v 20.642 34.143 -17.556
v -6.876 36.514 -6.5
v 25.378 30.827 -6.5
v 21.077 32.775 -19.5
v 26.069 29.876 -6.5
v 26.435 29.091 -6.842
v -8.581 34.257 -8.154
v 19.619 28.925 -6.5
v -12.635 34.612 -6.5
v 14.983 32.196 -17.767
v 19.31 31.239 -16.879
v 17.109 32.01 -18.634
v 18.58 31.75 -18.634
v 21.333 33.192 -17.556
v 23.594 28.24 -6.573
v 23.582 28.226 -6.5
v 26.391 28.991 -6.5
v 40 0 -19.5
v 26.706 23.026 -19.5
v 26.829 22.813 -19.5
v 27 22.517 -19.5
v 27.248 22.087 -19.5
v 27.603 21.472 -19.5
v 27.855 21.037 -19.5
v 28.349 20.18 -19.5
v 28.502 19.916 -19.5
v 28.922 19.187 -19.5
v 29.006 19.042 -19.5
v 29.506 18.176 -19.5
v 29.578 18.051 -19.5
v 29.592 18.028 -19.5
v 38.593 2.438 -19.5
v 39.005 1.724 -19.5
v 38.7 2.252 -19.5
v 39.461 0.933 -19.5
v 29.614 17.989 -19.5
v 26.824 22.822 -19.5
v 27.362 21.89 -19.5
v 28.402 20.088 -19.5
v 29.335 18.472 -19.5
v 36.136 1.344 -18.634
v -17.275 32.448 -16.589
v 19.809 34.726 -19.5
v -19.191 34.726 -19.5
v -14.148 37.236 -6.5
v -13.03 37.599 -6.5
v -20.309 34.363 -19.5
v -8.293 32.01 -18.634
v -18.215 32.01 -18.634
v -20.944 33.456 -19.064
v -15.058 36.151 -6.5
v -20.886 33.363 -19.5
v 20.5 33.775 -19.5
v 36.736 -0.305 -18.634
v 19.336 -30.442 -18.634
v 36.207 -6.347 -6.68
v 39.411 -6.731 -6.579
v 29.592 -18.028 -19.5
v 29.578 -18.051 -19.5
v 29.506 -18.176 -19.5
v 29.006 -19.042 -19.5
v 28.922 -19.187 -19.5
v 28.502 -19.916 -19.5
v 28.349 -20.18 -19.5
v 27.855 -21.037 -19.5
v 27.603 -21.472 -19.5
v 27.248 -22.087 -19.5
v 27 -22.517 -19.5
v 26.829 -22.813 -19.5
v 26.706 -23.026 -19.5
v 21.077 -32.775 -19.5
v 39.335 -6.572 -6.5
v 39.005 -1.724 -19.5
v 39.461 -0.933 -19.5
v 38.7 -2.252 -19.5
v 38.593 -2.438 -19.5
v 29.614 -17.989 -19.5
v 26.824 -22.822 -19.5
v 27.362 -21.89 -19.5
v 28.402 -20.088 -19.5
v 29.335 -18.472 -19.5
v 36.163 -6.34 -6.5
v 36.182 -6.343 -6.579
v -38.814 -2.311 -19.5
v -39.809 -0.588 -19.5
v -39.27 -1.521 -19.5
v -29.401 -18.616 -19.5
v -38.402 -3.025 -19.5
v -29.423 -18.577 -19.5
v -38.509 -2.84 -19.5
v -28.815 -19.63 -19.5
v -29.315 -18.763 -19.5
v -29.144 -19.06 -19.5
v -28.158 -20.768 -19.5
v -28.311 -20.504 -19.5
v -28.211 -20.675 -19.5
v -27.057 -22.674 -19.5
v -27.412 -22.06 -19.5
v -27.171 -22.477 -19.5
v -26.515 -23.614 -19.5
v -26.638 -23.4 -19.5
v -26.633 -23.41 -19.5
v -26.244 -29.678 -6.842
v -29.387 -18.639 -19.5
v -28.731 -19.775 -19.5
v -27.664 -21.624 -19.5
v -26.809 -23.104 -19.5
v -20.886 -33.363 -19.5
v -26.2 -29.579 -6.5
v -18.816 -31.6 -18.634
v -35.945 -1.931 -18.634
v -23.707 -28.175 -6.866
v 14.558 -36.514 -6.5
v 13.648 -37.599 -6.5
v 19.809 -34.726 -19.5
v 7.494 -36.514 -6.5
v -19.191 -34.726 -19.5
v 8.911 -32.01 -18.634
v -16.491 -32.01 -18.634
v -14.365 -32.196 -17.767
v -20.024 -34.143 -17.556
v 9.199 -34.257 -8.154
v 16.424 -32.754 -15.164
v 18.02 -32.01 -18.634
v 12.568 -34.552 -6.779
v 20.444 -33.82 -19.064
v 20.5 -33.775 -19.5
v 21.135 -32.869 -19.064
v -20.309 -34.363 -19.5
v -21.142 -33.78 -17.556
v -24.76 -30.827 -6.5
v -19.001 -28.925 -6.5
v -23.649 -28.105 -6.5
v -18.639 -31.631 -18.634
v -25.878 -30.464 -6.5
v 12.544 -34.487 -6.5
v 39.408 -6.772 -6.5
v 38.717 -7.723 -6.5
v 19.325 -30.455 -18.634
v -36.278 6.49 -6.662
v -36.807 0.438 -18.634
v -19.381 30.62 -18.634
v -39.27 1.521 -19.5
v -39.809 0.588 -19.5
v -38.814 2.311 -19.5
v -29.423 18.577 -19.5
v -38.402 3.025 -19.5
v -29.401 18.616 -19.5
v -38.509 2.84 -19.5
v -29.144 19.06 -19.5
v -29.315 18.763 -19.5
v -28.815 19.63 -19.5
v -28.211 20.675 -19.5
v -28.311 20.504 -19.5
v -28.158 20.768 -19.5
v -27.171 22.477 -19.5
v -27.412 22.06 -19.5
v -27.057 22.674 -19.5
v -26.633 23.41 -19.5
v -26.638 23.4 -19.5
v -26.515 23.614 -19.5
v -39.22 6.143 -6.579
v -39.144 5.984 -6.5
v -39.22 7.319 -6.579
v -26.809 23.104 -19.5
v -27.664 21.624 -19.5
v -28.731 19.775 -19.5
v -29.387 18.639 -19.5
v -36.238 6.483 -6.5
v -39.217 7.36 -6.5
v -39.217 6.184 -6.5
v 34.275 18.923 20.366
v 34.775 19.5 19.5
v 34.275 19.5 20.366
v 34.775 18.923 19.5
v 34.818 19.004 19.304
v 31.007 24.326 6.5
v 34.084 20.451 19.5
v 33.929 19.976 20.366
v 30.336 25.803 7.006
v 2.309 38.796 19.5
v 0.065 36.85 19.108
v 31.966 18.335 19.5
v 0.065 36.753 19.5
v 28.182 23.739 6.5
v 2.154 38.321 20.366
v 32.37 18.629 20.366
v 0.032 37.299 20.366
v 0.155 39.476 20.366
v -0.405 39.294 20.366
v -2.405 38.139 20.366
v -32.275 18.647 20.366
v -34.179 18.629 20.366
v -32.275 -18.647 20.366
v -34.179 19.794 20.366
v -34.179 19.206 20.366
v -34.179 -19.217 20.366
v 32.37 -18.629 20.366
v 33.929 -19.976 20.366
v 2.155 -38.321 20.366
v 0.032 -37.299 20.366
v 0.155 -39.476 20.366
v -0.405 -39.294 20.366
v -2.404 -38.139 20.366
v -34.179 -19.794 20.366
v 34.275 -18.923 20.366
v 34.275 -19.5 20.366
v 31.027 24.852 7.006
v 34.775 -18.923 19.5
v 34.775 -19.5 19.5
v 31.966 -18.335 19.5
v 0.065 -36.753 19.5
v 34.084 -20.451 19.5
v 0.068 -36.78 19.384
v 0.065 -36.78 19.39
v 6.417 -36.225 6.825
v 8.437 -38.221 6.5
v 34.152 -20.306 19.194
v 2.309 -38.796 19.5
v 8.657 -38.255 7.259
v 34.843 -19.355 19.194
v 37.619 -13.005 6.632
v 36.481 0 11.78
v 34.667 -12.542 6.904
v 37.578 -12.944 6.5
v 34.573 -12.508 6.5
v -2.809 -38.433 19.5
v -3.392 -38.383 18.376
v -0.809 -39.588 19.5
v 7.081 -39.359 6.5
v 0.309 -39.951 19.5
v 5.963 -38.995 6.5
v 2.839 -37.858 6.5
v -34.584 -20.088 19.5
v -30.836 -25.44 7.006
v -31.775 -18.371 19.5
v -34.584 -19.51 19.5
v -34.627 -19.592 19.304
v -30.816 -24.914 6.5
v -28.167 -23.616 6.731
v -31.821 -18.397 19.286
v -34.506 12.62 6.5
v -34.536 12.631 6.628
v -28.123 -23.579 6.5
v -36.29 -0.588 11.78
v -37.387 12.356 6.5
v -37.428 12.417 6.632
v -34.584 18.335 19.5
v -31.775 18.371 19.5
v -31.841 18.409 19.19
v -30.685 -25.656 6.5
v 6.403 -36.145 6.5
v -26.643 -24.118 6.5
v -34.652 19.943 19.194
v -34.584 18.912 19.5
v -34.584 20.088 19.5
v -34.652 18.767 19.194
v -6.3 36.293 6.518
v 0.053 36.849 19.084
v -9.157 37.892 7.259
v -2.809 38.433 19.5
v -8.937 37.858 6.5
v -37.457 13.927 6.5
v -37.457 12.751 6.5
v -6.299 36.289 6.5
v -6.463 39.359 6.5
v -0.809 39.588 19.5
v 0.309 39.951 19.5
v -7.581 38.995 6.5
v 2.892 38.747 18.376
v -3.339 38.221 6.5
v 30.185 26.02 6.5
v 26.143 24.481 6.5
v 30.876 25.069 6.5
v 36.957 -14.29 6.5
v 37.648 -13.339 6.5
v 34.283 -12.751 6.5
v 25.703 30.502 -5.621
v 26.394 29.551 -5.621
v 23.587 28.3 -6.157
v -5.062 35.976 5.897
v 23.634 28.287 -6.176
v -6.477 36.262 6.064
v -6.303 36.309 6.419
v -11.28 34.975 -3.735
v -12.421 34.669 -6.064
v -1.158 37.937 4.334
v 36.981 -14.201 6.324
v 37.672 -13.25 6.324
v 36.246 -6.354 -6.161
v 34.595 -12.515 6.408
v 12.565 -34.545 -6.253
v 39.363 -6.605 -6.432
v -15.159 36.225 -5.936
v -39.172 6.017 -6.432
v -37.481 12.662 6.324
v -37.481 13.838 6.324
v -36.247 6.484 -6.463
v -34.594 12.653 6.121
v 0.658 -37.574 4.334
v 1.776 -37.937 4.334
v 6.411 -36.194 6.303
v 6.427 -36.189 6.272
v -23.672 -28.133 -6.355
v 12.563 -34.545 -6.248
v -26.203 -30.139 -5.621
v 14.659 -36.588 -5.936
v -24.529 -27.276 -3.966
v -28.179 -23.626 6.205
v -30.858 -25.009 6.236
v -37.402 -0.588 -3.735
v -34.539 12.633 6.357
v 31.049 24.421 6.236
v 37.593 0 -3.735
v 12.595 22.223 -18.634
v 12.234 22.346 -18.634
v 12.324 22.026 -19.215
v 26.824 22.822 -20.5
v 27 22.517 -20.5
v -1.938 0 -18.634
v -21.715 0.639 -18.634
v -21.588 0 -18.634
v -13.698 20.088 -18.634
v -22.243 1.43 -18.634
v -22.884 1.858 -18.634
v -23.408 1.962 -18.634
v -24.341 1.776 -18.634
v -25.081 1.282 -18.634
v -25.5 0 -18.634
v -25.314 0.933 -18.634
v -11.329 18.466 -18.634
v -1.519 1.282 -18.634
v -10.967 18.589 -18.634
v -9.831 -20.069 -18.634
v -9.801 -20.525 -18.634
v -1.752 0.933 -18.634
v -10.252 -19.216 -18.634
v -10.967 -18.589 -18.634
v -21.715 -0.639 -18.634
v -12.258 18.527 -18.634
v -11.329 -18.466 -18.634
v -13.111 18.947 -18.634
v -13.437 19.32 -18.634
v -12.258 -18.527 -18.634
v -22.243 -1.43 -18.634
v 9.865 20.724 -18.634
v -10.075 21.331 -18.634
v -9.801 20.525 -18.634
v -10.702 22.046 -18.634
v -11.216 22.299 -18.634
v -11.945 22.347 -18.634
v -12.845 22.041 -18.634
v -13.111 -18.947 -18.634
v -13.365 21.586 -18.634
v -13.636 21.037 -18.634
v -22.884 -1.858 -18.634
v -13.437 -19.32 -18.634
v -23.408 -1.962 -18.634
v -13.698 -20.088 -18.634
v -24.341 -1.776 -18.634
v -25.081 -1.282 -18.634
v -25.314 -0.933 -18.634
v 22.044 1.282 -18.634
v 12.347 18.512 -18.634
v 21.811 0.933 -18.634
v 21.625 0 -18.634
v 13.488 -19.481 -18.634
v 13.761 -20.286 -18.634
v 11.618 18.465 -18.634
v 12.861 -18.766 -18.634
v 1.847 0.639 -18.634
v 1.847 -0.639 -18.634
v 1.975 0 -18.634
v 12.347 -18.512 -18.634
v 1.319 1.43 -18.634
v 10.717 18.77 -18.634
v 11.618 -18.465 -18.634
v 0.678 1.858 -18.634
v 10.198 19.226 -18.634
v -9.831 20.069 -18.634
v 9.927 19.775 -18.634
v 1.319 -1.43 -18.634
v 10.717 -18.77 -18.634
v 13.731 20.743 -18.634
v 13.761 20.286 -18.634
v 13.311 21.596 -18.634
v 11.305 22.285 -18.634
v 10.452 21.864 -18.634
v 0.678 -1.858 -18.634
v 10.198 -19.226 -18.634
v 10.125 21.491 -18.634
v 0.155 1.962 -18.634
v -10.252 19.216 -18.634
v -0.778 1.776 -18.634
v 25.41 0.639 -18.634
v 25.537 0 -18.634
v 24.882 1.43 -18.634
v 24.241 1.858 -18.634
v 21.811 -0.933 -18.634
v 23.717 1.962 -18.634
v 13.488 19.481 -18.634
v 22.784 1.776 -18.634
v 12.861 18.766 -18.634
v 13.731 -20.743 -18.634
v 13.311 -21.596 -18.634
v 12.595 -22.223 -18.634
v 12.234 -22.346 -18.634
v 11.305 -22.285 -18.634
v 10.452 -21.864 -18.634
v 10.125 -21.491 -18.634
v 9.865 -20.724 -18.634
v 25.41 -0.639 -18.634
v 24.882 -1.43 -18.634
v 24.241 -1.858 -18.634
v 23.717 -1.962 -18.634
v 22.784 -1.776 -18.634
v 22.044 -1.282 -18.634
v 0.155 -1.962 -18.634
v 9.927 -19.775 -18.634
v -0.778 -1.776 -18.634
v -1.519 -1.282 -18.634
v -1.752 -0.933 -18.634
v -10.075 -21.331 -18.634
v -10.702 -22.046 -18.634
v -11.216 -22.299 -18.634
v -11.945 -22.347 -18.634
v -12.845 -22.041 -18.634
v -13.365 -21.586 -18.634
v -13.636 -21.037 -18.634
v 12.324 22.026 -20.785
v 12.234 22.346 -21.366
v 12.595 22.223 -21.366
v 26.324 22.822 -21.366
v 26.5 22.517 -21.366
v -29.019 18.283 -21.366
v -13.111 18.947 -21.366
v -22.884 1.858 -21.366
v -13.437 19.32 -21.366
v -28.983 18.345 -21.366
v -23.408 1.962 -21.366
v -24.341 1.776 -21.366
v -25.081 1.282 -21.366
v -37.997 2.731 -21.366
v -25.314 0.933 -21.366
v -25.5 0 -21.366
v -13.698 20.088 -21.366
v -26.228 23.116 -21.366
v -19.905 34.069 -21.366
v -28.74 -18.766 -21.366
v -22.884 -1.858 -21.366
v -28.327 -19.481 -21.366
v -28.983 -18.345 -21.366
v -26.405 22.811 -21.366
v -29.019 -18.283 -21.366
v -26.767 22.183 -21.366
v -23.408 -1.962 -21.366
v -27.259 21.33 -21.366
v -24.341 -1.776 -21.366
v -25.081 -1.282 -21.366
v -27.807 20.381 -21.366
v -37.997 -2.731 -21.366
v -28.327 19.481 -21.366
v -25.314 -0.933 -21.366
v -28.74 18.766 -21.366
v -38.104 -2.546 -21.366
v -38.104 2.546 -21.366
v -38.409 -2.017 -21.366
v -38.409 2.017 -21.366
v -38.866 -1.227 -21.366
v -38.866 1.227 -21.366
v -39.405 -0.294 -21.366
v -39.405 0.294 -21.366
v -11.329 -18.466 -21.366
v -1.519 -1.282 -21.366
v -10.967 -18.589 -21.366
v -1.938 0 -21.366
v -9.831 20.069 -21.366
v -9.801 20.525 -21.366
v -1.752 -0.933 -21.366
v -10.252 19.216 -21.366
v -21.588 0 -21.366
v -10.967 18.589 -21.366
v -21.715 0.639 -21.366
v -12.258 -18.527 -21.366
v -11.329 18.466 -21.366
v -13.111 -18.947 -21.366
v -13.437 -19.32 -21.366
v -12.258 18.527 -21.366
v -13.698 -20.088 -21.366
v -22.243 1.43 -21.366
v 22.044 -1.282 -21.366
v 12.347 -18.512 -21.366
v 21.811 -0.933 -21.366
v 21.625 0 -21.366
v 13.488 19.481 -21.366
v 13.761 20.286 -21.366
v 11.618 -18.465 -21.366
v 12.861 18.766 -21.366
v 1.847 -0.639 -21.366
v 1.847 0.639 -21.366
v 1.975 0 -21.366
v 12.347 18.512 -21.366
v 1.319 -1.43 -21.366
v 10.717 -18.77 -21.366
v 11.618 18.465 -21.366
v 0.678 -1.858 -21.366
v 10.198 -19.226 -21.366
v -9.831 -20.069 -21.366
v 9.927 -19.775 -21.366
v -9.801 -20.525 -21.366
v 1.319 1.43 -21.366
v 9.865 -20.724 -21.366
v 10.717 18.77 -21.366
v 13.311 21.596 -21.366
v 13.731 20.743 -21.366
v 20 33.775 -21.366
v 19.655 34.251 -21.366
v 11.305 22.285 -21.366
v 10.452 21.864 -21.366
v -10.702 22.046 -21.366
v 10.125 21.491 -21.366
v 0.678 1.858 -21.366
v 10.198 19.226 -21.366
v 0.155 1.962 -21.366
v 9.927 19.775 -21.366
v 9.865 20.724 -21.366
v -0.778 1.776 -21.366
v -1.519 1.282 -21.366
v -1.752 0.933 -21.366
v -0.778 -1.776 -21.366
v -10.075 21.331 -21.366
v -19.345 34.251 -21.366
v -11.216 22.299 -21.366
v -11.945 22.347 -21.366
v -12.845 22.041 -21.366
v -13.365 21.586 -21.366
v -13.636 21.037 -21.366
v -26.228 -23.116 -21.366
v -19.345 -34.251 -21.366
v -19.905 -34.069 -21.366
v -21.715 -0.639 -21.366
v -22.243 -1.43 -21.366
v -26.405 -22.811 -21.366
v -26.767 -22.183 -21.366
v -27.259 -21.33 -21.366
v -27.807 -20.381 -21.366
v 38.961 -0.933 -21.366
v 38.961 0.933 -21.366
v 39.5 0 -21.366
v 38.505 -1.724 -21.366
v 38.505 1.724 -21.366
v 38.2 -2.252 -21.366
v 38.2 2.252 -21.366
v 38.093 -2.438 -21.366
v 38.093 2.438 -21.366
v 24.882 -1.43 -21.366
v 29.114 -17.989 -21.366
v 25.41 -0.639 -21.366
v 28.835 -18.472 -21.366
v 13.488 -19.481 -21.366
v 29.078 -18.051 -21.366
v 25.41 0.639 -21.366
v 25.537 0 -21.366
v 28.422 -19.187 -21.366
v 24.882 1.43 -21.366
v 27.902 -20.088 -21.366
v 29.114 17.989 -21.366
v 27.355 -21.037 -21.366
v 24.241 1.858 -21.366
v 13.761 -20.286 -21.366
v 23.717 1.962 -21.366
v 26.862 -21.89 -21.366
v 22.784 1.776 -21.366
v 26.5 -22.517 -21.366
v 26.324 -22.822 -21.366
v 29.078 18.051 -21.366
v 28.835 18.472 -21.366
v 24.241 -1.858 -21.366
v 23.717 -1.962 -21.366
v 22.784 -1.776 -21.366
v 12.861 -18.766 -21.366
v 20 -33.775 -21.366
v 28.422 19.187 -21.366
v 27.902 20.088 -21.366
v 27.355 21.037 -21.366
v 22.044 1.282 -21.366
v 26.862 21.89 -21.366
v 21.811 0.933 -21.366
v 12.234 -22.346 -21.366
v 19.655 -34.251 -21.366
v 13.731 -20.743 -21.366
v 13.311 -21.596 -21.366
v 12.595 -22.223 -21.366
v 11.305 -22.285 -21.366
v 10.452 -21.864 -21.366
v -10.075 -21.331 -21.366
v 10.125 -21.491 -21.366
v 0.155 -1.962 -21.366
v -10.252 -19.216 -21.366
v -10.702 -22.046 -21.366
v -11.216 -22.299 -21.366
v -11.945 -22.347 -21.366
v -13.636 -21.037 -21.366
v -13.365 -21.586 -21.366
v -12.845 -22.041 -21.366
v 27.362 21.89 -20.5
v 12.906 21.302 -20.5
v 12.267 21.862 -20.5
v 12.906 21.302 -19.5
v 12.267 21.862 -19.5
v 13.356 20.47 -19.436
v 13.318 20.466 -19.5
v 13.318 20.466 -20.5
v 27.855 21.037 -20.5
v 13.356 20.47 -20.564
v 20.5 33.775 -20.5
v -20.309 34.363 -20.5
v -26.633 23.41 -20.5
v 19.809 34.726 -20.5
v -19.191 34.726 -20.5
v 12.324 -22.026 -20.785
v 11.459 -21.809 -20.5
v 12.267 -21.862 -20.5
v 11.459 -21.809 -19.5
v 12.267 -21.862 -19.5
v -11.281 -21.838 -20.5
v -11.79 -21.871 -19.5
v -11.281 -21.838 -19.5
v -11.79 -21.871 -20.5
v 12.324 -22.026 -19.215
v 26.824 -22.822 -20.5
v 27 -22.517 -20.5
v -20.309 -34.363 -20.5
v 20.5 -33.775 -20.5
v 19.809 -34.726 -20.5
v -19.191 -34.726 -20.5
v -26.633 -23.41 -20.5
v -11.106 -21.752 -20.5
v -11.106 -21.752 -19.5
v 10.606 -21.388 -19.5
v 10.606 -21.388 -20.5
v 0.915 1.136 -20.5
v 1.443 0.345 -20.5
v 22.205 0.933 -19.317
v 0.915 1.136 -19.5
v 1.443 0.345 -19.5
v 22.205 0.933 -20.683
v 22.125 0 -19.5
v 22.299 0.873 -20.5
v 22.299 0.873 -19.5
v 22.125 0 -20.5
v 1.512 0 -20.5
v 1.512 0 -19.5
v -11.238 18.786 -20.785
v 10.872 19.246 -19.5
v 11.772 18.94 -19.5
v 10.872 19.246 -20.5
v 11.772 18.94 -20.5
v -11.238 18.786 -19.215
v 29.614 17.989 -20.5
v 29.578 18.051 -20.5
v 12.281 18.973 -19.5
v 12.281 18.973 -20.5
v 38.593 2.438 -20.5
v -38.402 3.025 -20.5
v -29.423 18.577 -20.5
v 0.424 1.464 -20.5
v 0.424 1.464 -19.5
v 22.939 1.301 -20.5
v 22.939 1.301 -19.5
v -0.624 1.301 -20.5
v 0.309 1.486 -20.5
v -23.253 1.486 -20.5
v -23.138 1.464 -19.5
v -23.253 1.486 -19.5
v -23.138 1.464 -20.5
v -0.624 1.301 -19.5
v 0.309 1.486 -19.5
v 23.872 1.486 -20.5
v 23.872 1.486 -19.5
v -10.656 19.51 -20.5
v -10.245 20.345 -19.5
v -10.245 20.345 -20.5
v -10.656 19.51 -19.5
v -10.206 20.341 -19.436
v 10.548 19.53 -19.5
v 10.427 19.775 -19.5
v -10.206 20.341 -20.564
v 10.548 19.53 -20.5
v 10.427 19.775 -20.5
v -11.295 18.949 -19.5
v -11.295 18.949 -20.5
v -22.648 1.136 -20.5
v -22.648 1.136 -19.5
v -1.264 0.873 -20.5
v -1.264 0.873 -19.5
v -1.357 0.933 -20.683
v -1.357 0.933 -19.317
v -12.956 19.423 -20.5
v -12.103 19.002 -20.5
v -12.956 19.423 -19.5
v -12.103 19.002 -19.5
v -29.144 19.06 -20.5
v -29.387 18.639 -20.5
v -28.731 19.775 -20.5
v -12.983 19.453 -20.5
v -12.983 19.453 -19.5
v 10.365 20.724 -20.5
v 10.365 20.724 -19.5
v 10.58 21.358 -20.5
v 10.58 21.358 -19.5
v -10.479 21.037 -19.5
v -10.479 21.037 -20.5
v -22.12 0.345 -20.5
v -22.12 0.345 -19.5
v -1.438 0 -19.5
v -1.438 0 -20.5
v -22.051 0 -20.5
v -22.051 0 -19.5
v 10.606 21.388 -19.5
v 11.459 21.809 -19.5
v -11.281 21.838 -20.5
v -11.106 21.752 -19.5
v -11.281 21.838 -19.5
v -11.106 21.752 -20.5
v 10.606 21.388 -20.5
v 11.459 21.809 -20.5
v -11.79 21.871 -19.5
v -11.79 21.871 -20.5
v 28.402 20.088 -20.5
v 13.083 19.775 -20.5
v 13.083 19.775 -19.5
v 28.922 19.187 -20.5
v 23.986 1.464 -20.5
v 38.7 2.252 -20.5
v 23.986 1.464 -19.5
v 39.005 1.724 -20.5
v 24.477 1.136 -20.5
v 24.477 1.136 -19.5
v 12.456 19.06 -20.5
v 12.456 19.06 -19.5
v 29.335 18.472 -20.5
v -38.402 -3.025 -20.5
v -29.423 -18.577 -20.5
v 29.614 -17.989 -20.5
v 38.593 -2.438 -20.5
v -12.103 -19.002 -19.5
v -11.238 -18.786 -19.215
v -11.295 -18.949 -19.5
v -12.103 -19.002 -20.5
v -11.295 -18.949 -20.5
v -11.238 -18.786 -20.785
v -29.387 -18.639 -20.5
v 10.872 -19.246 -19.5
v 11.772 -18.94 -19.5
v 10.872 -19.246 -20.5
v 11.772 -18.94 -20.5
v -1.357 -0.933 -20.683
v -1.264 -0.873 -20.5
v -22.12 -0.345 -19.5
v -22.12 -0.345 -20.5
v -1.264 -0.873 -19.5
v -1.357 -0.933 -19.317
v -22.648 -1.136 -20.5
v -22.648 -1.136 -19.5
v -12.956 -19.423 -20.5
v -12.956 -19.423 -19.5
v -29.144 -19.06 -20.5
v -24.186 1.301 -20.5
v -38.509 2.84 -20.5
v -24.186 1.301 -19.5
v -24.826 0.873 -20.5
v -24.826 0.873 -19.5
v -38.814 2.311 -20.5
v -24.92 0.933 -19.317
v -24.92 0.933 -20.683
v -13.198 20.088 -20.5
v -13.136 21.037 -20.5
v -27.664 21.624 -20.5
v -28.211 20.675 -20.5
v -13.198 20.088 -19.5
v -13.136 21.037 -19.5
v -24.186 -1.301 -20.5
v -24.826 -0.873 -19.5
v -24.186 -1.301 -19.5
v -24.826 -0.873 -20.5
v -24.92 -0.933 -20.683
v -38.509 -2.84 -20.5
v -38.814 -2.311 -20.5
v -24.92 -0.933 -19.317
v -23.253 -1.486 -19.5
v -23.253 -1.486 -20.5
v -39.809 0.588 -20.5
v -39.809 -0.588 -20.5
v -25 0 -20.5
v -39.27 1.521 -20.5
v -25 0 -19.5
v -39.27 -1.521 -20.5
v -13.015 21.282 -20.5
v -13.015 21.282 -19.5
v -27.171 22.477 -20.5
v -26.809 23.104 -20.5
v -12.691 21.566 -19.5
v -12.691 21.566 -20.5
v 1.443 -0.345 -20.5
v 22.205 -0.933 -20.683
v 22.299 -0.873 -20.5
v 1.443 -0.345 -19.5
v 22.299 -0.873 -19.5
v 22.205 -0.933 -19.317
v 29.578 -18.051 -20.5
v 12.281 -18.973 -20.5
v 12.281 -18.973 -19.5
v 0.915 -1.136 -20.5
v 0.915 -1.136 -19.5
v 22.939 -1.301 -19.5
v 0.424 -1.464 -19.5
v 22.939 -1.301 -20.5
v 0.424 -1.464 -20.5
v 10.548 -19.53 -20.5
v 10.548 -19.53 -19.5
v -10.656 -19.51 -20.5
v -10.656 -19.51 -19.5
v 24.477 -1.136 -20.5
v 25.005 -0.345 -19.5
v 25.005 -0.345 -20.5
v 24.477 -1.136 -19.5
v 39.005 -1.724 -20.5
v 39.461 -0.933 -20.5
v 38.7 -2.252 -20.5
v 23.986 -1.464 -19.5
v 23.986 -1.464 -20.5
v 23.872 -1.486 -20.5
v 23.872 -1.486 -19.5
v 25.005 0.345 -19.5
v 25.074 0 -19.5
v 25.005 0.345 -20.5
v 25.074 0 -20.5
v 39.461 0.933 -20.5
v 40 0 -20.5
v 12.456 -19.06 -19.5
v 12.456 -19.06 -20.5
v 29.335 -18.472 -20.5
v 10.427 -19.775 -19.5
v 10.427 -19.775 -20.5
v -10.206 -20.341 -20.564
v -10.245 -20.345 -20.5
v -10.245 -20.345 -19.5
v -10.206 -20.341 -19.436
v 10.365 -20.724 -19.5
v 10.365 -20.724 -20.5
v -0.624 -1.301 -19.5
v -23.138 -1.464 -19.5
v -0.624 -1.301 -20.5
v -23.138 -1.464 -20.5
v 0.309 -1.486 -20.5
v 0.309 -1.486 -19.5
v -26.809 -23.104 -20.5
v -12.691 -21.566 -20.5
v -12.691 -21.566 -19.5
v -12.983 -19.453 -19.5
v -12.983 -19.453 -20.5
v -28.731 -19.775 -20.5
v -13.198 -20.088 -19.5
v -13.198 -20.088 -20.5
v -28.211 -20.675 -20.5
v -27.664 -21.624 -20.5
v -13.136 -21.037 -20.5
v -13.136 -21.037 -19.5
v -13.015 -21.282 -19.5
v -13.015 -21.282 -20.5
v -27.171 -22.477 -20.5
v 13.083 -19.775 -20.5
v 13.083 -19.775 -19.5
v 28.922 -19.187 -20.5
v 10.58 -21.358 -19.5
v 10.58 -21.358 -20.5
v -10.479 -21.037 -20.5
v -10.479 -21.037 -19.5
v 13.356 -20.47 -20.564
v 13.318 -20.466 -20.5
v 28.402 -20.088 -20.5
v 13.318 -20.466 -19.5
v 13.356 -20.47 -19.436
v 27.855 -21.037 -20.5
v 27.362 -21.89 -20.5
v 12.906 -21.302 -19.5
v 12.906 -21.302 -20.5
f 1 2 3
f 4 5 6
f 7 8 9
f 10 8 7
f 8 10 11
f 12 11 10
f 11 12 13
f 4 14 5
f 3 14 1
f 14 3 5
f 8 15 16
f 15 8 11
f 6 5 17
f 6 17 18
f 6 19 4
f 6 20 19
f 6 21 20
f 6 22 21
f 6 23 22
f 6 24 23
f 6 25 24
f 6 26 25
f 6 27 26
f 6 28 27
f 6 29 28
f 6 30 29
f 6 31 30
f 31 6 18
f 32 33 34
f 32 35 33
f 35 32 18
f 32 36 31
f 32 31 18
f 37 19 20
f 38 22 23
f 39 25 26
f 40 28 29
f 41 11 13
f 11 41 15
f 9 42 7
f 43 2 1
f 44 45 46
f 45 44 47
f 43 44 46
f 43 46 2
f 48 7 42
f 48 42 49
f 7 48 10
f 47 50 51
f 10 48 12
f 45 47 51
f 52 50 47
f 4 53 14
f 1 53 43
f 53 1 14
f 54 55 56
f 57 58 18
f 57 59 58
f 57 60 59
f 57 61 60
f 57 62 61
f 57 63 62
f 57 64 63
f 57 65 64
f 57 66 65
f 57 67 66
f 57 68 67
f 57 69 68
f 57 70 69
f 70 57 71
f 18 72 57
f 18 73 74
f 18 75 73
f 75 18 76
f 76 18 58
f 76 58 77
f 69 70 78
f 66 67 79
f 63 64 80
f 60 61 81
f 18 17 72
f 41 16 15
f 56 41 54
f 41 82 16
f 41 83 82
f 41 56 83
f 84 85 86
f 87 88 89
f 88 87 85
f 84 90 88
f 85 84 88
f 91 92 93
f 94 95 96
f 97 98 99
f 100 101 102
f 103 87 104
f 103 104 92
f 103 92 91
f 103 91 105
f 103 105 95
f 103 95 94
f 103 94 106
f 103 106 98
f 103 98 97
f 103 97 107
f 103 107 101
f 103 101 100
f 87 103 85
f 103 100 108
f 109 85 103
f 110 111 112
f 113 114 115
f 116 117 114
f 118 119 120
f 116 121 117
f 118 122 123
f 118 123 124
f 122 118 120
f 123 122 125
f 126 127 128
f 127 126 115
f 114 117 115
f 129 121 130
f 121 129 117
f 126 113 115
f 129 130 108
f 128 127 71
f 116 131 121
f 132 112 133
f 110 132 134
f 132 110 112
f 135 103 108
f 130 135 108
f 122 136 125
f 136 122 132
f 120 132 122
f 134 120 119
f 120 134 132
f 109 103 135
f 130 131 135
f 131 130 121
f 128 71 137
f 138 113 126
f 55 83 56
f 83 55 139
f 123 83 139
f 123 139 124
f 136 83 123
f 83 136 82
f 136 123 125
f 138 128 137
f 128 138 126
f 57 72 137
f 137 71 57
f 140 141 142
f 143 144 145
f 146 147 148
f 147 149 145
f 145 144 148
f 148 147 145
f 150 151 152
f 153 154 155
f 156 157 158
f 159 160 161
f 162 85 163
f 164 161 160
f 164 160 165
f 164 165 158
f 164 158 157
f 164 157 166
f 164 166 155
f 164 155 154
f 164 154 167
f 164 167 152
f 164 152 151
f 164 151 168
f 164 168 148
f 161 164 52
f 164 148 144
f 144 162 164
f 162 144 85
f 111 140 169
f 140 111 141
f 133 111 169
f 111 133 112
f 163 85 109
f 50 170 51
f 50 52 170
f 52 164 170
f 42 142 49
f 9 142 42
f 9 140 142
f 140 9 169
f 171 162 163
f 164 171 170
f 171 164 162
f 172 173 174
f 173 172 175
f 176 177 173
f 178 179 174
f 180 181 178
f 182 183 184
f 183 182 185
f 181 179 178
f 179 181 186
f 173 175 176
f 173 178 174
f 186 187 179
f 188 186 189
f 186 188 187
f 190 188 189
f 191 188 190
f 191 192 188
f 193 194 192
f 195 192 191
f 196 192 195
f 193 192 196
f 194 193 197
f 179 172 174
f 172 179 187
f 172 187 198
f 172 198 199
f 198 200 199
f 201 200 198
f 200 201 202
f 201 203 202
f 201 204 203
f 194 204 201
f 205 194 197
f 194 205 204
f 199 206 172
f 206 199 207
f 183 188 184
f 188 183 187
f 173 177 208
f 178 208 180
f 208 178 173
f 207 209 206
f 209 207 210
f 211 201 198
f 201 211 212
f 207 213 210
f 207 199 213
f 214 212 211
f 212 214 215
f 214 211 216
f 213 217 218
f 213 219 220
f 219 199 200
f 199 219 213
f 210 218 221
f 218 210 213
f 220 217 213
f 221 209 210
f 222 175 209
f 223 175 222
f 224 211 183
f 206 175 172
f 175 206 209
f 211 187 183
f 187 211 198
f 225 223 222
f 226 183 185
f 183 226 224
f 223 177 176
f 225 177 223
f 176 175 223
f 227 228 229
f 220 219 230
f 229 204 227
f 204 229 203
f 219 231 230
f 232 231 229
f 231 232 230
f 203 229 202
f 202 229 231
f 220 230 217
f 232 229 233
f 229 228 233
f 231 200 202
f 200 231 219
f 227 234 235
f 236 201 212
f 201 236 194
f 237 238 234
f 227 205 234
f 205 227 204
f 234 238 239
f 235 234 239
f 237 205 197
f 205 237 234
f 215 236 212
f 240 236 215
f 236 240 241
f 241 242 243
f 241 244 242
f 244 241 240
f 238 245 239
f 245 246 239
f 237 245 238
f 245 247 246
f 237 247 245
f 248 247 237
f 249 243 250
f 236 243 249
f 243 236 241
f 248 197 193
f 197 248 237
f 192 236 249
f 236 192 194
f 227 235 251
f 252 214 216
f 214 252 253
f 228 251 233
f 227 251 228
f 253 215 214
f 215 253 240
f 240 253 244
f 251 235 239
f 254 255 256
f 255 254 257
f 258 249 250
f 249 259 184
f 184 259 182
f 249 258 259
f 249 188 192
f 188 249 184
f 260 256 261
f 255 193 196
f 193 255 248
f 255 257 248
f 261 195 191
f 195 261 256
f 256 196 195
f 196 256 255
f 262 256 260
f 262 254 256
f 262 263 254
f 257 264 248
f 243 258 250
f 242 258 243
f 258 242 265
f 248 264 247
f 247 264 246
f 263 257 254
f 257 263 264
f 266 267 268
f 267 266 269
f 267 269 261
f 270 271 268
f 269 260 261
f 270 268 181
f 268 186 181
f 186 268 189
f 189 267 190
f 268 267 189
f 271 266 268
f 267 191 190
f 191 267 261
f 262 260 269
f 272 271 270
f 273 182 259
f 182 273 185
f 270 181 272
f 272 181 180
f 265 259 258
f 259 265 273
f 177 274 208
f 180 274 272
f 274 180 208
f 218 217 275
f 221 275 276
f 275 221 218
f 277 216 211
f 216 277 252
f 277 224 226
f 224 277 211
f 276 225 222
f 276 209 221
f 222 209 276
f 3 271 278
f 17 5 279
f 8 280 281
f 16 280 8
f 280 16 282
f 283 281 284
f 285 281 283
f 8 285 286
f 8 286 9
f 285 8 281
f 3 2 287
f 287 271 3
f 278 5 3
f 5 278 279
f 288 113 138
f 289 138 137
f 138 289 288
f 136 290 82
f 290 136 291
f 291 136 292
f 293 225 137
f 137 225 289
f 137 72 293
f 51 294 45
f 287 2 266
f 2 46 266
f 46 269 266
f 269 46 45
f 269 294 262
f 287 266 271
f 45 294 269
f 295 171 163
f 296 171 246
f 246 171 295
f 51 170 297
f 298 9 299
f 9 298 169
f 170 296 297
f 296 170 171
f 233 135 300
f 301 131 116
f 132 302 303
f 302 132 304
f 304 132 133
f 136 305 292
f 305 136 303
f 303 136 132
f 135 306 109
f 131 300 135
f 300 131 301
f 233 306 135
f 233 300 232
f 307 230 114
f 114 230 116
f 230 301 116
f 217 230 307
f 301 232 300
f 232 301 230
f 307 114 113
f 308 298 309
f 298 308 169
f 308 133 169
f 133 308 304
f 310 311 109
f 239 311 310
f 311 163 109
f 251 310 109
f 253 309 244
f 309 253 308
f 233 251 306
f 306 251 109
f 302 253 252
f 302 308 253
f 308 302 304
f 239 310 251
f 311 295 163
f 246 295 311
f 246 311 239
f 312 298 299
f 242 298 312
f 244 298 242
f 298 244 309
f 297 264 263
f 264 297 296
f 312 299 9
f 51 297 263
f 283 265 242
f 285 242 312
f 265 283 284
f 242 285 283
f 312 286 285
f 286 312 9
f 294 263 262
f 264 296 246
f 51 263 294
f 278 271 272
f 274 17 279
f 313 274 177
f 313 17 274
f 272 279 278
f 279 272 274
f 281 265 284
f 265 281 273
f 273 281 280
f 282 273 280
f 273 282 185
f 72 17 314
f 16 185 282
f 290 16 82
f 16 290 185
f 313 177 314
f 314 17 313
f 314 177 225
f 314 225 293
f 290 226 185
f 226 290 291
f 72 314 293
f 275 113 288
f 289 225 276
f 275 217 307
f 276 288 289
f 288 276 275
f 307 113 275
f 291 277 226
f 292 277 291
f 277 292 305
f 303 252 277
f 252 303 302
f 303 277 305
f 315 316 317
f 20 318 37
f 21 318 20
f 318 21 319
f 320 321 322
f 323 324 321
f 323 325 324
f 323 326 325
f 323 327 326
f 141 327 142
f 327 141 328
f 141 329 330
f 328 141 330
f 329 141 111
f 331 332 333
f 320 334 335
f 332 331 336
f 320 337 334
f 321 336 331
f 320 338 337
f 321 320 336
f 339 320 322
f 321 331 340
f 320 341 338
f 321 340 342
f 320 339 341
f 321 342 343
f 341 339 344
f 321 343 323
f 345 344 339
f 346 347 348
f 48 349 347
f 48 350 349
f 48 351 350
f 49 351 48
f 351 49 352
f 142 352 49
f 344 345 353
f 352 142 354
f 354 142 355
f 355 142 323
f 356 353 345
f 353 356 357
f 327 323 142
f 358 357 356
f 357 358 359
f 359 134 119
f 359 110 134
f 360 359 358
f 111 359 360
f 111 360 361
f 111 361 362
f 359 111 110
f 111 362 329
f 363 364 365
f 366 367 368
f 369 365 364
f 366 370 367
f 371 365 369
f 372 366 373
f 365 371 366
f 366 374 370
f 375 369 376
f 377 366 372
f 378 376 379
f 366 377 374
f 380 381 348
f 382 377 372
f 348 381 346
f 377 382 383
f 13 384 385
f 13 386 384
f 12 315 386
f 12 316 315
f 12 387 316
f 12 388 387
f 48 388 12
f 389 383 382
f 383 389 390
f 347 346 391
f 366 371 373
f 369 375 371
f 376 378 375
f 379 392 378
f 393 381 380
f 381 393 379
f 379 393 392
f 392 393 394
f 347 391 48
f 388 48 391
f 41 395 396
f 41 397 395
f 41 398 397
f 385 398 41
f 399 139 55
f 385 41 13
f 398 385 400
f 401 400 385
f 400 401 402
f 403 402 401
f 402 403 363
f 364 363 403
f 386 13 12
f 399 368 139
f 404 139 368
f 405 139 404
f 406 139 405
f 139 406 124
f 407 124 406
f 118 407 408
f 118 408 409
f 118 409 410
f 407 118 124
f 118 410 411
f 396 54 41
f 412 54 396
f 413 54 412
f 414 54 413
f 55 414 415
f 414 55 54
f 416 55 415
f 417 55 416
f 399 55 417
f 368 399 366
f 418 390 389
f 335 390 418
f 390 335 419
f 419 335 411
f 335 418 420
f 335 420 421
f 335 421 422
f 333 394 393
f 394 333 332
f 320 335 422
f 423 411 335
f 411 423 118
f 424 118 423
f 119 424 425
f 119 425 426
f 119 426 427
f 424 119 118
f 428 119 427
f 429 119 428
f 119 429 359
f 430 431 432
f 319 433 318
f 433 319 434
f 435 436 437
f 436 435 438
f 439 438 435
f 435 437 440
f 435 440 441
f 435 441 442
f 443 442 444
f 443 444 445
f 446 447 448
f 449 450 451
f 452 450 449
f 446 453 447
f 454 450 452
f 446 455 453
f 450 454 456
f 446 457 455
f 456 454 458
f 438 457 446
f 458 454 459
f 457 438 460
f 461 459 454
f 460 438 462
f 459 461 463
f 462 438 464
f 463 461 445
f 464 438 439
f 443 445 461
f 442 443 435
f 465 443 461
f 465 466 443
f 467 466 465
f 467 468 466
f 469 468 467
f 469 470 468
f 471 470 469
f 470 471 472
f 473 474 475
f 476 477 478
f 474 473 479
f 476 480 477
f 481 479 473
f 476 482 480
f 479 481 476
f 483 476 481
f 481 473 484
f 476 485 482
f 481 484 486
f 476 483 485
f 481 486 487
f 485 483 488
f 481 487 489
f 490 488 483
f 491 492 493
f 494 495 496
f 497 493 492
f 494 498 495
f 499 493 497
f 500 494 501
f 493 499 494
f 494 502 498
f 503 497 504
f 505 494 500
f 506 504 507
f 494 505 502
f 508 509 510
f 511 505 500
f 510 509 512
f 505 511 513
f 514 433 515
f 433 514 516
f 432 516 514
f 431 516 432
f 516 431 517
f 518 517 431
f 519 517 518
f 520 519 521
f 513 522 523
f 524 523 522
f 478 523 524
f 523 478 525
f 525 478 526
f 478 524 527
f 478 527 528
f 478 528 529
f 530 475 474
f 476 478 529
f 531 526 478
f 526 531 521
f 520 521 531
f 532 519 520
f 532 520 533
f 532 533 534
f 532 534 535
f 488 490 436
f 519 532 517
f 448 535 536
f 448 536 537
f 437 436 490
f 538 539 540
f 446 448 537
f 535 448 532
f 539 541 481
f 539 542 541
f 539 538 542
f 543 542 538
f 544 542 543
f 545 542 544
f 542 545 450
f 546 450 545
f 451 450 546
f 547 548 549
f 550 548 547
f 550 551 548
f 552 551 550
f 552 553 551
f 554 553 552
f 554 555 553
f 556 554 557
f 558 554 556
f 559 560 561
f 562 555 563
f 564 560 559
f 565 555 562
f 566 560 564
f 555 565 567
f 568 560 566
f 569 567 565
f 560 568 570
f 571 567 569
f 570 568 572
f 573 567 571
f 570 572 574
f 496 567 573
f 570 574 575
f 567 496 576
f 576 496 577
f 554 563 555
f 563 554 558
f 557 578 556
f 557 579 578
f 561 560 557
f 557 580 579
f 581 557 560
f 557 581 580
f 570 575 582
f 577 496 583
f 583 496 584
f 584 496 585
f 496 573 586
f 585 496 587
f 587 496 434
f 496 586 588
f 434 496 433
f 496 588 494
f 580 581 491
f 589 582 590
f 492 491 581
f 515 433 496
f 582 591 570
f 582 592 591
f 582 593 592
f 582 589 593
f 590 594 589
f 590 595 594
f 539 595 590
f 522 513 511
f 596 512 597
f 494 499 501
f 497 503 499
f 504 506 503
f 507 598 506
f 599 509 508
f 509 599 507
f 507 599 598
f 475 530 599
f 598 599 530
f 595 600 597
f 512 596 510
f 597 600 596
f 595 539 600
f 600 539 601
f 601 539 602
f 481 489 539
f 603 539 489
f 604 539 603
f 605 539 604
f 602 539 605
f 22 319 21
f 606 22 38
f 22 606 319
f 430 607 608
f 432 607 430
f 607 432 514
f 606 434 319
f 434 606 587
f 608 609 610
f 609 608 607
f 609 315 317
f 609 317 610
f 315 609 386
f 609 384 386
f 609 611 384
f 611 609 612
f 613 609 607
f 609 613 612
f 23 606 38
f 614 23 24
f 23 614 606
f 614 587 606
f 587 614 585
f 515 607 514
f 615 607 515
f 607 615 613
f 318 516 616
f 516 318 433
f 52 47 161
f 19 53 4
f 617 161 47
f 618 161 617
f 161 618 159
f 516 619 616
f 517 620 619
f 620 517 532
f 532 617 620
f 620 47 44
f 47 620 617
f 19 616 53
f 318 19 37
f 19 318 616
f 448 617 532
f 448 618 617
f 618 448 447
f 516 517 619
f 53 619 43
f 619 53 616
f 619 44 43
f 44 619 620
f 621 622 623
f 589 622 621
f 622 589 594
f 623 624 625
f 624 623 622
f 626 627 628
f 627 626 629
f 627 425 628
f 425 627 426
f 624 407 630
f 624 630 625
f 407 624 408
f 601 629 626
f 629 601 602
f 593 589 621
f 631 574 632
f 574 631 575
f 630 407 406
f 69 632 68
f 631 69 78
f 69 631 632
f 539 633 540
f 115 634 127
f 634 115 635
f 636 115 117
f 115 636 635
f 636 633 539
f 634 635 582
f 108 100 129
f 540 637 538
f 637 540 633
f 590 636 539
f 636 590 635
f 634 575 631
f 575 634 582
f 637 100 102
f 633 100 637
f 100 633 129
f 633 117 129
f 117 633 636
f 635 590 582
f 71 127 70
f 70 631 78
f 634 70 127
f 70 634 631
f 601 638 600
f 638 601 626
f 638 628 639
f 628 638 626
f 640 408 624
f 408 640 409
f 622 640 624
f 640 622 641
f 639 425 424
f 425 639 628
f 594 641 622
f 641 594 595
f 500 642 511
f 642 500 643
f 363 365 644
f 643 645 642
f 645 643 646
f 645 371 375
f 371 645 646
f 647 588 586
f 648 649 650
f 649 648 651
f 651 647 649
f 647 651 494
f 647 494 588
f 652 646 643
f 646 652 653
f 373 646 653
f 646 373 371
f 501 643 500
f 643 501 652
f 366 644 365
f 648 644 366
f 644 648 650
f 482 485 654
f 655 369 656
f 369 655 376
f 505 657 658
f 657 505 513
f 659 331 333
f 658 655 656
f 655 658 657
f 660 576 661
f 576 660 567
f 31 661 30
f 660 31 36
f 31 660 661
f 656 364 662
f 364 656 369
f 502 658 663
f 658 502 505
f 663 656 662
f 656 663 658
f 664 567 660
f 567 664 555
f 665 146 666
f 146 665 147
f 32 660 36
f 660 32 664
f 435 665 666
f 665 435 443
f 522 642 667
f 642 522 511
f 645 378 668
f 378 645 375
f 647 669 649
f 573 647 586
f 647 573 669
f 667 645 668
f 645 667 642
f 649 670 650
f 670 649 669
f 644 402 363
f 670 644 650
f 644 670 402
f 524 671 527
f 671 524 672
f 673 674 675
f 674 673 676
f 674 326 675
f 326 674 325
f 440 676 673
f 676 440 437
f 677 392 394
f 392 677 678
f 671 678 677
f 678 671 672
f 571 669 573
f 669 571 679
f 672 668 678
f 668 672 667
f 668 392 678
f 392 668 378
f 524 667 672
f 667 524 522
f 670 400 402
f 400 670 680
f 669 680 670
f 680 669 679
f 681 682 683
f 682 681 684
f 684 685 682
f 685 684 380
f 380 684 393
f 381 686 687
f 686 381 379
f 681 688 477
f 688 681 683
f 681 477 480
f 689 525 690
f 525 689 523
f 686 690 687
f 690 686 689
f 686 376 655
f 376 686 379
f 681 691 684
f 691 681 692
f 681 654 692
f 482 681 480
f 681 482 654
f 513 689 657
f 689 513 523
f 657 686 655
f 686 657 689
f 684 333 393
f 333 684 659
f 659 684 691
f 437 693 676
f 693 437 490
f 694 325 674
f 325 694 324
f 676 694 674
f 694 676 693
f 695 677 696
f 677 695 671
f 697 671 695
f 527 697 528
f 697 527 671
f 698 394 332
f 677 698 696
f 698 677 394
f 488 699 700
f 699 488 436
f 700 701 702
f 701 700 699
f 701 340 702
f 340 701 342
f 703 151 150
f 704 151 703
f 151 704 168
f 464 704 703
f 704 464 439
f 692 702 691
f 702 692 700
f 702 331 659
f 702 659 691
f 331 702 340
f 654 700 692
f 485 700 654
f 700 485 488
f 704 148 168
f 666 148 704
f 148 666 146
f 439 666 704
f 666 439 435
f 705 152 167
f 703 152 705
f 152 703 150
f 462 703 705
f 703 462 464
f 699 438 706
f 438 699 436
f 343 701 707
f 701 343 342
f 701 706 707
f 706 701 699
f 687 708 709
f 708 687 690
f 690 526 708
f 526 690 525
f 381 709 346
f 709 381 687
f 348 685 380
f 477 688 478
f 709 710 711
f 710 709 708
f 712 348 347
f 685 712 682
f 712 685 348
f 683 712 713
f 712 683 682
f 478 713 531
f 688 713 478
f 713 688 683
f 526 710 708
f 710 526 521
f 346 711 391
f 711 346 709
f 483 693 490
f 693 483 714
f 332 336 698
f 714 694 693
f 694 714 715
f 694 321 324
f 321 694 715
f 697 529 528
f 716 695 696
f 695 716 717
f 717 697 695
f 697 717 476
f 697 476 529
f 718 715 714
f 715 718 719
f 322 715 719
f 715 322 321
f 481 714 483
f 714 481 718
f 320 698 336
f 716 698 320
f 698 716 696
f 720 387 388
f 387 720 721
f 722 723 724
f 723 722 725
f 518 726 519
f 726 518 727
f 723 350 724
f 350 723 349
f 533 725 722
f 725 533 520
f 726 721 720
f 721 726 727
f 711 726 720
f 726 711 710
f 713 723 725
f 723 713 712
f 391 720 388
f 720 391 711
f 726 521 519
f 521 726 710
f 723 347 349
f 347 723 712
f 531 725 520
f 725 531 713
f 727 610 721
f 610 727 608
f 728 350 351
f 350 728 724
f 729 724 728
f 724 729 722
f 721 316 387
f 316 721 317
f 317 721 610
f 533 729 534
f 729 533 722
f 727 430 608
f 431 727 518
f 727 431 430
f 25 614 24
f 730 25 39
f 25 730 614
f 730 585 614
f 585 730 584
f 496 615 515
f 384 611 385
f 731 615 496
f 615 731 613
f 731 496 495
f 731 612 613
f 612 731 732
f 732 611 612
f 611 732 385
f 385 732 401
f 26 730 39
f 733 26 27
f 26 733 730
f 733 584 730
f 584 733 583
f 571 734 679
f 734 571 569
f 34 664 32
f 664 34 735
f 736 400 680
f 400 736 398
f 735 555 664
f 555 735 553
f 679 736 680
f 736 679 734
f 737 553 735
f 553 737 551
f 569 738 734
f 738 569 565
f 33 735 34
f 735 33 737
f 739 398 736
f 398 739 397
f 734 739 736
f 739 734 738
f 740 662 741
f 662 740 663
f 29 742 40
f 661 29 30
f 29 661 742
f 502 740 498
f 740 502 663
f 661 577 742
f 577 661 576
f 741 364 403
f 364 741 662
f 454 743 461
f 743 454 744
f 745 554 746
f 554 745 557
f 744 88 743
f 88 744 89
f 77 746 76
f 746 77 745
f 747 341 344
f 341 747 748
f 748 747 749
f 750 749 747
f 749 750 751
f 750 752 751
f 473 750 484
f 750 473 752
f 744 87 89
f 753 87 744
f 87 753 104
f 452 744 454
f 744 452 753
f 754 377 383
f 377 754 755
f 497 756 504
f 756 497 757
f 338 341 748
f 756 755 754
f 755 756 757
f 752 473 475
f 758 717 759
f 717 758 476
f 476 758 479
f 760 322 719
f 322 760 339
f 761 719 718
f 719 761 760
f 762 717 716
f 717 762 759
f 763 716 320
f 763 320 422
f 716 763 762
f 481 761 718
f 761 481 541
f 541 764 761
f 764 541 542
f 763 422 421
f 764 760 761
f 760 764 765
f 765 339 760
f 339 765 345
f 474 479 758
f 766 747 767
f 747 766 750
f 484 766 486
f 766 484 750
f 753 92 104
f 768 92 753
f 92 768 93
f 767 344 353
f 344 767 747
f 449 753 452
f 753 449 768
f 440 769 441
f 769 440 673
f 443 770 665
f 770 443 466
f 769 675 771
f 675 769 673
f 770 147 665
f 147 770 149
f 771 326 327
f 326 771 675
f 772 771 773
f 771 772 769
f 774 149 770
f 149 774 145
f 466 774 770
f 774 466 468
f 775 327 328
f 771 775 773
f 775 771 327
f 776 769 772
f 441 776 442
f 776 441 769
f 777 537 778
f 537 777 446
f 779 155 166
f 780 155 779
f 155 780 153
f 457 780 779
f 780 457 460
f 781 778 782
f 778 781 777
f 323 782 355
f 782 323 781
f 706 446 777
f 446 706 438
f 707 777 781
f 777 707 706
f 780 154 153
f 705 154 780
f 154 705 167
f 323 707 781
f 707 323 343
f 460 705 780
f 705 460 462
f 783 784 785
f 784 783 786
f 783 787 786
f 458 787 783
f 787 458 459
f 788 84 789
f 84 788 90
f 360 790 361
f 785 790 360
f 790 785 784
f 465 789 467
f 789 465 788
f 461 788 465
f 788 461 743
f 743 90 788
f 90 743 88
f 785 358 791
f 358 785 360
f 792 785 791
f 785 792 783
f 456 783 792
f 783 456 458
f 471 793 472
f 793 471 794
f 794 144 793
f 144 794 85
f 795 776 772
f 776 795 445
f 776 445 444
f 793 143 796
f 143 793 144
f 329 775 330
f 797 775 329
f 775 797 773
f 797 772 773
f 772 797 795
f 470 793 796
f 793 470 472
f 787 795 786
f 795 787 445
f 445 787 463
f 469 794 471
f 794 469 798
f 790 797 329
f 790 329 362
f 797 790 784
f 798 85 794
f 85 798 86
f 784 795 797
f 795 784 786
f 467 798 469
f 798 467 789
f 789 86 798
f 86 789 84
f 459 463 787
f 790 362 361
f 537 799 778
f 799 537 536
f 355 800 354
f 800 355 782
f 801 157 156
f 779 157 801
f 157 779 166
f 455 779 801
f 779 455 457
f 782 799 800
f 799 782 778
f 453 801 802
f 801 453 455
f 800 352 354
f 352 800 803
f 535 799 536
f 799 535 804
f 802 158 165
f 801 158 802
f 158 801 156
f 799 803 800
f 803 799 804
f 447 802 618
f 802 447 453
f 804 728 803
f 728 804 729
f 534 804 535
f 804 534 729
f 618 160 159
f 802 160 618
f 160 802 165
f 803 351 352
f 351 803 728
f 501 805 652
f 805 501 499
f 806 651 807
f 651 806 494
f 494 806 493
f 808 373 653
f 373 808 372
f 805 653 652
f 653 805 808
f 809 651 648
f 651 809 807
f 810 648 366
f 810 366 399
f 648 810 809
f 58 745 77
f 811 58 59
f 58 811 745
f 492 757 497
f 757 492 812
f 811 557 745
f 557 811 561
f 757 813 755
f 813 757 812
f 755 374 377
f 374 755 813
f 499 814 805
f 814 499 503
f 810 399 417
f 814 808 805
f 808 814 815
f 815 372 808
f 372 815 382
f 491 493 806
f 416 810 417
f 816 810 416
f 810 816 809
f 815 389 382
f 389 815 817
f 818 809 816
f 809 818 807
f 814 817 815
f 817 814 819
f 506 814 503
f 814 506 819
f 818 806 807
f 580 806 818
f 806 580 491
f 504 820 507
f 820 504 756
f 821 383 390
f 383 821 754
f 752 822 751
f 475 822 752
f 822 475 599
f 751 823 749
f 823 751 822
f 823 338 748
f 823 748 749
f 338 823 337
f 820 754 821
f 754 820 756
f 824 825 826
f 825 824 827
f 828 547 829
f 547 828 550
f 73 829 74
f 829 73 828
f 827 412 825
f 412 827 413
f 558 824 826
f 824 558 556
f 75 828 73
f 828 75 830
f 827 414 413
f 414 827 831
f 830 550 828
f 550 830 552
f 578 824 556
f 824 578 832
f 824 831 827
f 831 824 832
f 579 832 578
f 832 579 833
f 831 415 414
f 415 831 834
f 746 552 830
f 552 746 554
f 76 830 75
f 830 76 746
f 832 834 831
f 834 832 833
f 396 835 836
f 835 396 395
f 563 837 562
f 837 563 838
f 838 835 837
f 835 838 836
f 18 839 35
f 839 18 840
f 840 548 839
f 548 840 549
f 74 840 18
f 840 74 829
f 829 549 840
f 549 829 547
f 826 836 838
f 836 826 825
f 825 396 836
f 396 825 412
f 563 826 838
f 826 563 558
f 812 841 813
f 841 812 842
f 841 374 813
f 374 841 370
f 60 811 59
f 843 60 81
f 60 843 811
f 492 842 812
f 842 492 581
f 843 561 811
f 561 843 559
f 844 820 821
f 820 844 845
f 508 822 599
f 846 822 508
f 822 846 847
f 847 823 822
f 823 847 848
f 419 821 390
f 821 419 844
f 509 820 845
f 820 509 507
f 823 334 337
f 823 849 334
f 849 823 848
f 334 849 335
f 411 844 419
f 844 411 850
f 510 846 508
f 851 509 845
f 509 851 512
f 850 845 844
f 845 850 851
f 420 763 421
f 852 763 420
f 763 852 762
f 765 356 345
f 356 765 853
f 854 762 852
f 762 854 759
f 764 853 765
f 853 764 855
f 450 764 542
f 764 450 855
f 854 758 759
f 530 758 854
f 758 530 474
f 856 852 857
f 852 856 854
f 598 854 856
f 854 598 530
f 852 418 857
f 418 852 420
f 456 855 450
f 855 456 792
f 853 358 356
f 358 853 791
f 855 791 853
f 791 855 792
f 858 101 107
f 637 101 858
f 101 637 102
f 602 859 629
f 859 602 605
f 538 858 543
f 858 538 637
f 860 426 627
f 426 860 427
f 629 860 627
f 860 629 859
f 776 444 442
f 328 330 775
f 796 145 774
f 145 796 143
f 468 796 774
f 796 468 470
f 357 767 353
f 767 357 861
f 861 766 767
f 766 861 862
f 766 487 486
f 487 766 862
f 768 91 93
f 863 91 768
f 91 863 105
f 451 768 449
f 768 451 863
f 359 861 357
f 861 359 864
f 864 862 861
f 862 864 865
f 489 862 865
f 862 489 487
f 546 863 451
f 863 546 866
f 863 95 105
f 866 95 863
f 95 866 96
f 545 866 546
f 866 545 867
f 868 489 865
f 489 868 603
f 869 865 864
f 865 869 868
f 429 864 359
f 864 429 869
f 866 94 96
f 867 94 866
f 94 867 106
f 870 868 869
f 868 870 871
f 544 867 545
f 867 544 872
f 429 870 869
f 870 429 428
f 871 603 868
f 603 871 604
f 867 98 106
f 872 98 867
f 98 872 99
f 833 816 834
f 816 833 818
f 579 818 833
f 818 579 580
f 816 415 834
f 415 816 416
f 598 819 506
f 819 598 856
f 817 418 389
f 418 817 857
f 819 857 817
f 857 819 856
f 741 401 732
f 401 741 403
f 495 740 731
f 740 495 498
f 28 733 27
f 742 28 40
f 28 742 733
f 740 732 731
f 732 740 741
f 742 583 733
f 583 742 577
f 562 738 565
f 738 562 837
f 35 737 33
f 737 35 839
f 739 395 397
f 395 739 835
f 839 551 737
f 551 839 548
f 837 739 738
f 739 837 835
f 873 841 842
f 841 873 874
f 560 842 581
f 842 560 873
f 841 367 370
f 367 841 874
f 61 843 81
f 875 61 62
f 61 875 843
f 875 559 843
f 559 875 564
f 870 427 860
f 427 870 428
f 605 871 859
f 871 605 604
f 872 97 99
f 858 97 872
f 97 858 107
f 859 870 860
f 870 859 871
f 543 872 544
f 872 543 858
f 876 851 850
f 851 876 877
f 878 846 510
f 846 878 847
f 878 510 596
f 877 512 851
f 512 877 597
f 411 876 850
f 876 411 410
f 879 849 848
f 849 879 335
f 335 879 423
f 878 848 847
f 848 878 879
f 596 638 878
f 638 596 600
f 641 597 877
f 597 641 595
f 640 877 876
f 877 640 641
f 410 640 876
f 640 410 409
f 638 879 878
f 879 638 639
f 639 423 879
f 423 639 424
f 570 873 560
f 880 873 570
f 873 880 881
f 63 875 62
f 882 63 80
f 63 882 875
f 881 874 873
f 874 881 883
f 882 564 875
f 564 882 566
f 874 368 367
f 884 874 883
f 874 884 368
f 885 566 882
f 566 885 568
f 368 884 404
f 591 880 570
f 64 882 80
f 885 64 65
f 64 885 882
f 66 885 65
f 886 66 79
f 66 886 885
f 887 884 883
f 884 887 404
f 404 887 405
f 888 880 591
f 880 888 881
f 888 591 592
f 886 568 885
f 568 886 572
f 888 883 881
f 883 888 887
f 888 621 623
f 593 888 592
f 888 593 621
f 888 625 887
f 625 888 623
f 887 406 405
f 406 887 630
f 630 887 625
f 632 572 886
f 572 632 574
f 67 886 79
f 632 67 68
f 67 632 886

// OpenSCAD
/* Flower Pot (twisted) for Succulents */

// Thickness of the walls and floor
thick = 1;

// Heigth of the pot
h = 40;

// Diameter of the pot
d = 78;

// Make the object a little bit rounded and thickier? (recommended)
round = "yes"; //[yes,no]

// Twisting factor (in angles)
curling = 30; //[-90:90]

// Number of sides (the tray has 6 sides, so you may want to keep that)
sides = 6; //[3:36]

/* [Hidden] */
holes_d = d/32;
roundness = thick;

color([1,1,0]) minkowski(){
    linear_extrude(height=h-thick, center=true, twist=curling, slices=3, convexity=10){ 
        difference(){
            circle(r=d/2, $fn=sides, center=true);
            offset(r=-thick) circle(r=d/2, $fn=sides, center=true);
        }
    };
    if(round == "yes"){
        sphere(r=roundness);
    }
}
color([1,0,0]) minkowski(){
    translate([0,0,-h/2]) linear_extrude(height=thick, center=true){
        difference(){
            circle(r=d/2, $fn=sides, center=true);
            circle(r=holes_d, $fn=16, center=true);
            for(i=[1:sides]){
                rotate(a=i*360/sides){
                    translate([d/3-holes_d,0,0]){
                        circle(r=holes_d, $fn=16, center=true);
                    }
                }
            }
        }
    }
    if(round == "yes"){
        sphere(r=roundness);
    }
}
